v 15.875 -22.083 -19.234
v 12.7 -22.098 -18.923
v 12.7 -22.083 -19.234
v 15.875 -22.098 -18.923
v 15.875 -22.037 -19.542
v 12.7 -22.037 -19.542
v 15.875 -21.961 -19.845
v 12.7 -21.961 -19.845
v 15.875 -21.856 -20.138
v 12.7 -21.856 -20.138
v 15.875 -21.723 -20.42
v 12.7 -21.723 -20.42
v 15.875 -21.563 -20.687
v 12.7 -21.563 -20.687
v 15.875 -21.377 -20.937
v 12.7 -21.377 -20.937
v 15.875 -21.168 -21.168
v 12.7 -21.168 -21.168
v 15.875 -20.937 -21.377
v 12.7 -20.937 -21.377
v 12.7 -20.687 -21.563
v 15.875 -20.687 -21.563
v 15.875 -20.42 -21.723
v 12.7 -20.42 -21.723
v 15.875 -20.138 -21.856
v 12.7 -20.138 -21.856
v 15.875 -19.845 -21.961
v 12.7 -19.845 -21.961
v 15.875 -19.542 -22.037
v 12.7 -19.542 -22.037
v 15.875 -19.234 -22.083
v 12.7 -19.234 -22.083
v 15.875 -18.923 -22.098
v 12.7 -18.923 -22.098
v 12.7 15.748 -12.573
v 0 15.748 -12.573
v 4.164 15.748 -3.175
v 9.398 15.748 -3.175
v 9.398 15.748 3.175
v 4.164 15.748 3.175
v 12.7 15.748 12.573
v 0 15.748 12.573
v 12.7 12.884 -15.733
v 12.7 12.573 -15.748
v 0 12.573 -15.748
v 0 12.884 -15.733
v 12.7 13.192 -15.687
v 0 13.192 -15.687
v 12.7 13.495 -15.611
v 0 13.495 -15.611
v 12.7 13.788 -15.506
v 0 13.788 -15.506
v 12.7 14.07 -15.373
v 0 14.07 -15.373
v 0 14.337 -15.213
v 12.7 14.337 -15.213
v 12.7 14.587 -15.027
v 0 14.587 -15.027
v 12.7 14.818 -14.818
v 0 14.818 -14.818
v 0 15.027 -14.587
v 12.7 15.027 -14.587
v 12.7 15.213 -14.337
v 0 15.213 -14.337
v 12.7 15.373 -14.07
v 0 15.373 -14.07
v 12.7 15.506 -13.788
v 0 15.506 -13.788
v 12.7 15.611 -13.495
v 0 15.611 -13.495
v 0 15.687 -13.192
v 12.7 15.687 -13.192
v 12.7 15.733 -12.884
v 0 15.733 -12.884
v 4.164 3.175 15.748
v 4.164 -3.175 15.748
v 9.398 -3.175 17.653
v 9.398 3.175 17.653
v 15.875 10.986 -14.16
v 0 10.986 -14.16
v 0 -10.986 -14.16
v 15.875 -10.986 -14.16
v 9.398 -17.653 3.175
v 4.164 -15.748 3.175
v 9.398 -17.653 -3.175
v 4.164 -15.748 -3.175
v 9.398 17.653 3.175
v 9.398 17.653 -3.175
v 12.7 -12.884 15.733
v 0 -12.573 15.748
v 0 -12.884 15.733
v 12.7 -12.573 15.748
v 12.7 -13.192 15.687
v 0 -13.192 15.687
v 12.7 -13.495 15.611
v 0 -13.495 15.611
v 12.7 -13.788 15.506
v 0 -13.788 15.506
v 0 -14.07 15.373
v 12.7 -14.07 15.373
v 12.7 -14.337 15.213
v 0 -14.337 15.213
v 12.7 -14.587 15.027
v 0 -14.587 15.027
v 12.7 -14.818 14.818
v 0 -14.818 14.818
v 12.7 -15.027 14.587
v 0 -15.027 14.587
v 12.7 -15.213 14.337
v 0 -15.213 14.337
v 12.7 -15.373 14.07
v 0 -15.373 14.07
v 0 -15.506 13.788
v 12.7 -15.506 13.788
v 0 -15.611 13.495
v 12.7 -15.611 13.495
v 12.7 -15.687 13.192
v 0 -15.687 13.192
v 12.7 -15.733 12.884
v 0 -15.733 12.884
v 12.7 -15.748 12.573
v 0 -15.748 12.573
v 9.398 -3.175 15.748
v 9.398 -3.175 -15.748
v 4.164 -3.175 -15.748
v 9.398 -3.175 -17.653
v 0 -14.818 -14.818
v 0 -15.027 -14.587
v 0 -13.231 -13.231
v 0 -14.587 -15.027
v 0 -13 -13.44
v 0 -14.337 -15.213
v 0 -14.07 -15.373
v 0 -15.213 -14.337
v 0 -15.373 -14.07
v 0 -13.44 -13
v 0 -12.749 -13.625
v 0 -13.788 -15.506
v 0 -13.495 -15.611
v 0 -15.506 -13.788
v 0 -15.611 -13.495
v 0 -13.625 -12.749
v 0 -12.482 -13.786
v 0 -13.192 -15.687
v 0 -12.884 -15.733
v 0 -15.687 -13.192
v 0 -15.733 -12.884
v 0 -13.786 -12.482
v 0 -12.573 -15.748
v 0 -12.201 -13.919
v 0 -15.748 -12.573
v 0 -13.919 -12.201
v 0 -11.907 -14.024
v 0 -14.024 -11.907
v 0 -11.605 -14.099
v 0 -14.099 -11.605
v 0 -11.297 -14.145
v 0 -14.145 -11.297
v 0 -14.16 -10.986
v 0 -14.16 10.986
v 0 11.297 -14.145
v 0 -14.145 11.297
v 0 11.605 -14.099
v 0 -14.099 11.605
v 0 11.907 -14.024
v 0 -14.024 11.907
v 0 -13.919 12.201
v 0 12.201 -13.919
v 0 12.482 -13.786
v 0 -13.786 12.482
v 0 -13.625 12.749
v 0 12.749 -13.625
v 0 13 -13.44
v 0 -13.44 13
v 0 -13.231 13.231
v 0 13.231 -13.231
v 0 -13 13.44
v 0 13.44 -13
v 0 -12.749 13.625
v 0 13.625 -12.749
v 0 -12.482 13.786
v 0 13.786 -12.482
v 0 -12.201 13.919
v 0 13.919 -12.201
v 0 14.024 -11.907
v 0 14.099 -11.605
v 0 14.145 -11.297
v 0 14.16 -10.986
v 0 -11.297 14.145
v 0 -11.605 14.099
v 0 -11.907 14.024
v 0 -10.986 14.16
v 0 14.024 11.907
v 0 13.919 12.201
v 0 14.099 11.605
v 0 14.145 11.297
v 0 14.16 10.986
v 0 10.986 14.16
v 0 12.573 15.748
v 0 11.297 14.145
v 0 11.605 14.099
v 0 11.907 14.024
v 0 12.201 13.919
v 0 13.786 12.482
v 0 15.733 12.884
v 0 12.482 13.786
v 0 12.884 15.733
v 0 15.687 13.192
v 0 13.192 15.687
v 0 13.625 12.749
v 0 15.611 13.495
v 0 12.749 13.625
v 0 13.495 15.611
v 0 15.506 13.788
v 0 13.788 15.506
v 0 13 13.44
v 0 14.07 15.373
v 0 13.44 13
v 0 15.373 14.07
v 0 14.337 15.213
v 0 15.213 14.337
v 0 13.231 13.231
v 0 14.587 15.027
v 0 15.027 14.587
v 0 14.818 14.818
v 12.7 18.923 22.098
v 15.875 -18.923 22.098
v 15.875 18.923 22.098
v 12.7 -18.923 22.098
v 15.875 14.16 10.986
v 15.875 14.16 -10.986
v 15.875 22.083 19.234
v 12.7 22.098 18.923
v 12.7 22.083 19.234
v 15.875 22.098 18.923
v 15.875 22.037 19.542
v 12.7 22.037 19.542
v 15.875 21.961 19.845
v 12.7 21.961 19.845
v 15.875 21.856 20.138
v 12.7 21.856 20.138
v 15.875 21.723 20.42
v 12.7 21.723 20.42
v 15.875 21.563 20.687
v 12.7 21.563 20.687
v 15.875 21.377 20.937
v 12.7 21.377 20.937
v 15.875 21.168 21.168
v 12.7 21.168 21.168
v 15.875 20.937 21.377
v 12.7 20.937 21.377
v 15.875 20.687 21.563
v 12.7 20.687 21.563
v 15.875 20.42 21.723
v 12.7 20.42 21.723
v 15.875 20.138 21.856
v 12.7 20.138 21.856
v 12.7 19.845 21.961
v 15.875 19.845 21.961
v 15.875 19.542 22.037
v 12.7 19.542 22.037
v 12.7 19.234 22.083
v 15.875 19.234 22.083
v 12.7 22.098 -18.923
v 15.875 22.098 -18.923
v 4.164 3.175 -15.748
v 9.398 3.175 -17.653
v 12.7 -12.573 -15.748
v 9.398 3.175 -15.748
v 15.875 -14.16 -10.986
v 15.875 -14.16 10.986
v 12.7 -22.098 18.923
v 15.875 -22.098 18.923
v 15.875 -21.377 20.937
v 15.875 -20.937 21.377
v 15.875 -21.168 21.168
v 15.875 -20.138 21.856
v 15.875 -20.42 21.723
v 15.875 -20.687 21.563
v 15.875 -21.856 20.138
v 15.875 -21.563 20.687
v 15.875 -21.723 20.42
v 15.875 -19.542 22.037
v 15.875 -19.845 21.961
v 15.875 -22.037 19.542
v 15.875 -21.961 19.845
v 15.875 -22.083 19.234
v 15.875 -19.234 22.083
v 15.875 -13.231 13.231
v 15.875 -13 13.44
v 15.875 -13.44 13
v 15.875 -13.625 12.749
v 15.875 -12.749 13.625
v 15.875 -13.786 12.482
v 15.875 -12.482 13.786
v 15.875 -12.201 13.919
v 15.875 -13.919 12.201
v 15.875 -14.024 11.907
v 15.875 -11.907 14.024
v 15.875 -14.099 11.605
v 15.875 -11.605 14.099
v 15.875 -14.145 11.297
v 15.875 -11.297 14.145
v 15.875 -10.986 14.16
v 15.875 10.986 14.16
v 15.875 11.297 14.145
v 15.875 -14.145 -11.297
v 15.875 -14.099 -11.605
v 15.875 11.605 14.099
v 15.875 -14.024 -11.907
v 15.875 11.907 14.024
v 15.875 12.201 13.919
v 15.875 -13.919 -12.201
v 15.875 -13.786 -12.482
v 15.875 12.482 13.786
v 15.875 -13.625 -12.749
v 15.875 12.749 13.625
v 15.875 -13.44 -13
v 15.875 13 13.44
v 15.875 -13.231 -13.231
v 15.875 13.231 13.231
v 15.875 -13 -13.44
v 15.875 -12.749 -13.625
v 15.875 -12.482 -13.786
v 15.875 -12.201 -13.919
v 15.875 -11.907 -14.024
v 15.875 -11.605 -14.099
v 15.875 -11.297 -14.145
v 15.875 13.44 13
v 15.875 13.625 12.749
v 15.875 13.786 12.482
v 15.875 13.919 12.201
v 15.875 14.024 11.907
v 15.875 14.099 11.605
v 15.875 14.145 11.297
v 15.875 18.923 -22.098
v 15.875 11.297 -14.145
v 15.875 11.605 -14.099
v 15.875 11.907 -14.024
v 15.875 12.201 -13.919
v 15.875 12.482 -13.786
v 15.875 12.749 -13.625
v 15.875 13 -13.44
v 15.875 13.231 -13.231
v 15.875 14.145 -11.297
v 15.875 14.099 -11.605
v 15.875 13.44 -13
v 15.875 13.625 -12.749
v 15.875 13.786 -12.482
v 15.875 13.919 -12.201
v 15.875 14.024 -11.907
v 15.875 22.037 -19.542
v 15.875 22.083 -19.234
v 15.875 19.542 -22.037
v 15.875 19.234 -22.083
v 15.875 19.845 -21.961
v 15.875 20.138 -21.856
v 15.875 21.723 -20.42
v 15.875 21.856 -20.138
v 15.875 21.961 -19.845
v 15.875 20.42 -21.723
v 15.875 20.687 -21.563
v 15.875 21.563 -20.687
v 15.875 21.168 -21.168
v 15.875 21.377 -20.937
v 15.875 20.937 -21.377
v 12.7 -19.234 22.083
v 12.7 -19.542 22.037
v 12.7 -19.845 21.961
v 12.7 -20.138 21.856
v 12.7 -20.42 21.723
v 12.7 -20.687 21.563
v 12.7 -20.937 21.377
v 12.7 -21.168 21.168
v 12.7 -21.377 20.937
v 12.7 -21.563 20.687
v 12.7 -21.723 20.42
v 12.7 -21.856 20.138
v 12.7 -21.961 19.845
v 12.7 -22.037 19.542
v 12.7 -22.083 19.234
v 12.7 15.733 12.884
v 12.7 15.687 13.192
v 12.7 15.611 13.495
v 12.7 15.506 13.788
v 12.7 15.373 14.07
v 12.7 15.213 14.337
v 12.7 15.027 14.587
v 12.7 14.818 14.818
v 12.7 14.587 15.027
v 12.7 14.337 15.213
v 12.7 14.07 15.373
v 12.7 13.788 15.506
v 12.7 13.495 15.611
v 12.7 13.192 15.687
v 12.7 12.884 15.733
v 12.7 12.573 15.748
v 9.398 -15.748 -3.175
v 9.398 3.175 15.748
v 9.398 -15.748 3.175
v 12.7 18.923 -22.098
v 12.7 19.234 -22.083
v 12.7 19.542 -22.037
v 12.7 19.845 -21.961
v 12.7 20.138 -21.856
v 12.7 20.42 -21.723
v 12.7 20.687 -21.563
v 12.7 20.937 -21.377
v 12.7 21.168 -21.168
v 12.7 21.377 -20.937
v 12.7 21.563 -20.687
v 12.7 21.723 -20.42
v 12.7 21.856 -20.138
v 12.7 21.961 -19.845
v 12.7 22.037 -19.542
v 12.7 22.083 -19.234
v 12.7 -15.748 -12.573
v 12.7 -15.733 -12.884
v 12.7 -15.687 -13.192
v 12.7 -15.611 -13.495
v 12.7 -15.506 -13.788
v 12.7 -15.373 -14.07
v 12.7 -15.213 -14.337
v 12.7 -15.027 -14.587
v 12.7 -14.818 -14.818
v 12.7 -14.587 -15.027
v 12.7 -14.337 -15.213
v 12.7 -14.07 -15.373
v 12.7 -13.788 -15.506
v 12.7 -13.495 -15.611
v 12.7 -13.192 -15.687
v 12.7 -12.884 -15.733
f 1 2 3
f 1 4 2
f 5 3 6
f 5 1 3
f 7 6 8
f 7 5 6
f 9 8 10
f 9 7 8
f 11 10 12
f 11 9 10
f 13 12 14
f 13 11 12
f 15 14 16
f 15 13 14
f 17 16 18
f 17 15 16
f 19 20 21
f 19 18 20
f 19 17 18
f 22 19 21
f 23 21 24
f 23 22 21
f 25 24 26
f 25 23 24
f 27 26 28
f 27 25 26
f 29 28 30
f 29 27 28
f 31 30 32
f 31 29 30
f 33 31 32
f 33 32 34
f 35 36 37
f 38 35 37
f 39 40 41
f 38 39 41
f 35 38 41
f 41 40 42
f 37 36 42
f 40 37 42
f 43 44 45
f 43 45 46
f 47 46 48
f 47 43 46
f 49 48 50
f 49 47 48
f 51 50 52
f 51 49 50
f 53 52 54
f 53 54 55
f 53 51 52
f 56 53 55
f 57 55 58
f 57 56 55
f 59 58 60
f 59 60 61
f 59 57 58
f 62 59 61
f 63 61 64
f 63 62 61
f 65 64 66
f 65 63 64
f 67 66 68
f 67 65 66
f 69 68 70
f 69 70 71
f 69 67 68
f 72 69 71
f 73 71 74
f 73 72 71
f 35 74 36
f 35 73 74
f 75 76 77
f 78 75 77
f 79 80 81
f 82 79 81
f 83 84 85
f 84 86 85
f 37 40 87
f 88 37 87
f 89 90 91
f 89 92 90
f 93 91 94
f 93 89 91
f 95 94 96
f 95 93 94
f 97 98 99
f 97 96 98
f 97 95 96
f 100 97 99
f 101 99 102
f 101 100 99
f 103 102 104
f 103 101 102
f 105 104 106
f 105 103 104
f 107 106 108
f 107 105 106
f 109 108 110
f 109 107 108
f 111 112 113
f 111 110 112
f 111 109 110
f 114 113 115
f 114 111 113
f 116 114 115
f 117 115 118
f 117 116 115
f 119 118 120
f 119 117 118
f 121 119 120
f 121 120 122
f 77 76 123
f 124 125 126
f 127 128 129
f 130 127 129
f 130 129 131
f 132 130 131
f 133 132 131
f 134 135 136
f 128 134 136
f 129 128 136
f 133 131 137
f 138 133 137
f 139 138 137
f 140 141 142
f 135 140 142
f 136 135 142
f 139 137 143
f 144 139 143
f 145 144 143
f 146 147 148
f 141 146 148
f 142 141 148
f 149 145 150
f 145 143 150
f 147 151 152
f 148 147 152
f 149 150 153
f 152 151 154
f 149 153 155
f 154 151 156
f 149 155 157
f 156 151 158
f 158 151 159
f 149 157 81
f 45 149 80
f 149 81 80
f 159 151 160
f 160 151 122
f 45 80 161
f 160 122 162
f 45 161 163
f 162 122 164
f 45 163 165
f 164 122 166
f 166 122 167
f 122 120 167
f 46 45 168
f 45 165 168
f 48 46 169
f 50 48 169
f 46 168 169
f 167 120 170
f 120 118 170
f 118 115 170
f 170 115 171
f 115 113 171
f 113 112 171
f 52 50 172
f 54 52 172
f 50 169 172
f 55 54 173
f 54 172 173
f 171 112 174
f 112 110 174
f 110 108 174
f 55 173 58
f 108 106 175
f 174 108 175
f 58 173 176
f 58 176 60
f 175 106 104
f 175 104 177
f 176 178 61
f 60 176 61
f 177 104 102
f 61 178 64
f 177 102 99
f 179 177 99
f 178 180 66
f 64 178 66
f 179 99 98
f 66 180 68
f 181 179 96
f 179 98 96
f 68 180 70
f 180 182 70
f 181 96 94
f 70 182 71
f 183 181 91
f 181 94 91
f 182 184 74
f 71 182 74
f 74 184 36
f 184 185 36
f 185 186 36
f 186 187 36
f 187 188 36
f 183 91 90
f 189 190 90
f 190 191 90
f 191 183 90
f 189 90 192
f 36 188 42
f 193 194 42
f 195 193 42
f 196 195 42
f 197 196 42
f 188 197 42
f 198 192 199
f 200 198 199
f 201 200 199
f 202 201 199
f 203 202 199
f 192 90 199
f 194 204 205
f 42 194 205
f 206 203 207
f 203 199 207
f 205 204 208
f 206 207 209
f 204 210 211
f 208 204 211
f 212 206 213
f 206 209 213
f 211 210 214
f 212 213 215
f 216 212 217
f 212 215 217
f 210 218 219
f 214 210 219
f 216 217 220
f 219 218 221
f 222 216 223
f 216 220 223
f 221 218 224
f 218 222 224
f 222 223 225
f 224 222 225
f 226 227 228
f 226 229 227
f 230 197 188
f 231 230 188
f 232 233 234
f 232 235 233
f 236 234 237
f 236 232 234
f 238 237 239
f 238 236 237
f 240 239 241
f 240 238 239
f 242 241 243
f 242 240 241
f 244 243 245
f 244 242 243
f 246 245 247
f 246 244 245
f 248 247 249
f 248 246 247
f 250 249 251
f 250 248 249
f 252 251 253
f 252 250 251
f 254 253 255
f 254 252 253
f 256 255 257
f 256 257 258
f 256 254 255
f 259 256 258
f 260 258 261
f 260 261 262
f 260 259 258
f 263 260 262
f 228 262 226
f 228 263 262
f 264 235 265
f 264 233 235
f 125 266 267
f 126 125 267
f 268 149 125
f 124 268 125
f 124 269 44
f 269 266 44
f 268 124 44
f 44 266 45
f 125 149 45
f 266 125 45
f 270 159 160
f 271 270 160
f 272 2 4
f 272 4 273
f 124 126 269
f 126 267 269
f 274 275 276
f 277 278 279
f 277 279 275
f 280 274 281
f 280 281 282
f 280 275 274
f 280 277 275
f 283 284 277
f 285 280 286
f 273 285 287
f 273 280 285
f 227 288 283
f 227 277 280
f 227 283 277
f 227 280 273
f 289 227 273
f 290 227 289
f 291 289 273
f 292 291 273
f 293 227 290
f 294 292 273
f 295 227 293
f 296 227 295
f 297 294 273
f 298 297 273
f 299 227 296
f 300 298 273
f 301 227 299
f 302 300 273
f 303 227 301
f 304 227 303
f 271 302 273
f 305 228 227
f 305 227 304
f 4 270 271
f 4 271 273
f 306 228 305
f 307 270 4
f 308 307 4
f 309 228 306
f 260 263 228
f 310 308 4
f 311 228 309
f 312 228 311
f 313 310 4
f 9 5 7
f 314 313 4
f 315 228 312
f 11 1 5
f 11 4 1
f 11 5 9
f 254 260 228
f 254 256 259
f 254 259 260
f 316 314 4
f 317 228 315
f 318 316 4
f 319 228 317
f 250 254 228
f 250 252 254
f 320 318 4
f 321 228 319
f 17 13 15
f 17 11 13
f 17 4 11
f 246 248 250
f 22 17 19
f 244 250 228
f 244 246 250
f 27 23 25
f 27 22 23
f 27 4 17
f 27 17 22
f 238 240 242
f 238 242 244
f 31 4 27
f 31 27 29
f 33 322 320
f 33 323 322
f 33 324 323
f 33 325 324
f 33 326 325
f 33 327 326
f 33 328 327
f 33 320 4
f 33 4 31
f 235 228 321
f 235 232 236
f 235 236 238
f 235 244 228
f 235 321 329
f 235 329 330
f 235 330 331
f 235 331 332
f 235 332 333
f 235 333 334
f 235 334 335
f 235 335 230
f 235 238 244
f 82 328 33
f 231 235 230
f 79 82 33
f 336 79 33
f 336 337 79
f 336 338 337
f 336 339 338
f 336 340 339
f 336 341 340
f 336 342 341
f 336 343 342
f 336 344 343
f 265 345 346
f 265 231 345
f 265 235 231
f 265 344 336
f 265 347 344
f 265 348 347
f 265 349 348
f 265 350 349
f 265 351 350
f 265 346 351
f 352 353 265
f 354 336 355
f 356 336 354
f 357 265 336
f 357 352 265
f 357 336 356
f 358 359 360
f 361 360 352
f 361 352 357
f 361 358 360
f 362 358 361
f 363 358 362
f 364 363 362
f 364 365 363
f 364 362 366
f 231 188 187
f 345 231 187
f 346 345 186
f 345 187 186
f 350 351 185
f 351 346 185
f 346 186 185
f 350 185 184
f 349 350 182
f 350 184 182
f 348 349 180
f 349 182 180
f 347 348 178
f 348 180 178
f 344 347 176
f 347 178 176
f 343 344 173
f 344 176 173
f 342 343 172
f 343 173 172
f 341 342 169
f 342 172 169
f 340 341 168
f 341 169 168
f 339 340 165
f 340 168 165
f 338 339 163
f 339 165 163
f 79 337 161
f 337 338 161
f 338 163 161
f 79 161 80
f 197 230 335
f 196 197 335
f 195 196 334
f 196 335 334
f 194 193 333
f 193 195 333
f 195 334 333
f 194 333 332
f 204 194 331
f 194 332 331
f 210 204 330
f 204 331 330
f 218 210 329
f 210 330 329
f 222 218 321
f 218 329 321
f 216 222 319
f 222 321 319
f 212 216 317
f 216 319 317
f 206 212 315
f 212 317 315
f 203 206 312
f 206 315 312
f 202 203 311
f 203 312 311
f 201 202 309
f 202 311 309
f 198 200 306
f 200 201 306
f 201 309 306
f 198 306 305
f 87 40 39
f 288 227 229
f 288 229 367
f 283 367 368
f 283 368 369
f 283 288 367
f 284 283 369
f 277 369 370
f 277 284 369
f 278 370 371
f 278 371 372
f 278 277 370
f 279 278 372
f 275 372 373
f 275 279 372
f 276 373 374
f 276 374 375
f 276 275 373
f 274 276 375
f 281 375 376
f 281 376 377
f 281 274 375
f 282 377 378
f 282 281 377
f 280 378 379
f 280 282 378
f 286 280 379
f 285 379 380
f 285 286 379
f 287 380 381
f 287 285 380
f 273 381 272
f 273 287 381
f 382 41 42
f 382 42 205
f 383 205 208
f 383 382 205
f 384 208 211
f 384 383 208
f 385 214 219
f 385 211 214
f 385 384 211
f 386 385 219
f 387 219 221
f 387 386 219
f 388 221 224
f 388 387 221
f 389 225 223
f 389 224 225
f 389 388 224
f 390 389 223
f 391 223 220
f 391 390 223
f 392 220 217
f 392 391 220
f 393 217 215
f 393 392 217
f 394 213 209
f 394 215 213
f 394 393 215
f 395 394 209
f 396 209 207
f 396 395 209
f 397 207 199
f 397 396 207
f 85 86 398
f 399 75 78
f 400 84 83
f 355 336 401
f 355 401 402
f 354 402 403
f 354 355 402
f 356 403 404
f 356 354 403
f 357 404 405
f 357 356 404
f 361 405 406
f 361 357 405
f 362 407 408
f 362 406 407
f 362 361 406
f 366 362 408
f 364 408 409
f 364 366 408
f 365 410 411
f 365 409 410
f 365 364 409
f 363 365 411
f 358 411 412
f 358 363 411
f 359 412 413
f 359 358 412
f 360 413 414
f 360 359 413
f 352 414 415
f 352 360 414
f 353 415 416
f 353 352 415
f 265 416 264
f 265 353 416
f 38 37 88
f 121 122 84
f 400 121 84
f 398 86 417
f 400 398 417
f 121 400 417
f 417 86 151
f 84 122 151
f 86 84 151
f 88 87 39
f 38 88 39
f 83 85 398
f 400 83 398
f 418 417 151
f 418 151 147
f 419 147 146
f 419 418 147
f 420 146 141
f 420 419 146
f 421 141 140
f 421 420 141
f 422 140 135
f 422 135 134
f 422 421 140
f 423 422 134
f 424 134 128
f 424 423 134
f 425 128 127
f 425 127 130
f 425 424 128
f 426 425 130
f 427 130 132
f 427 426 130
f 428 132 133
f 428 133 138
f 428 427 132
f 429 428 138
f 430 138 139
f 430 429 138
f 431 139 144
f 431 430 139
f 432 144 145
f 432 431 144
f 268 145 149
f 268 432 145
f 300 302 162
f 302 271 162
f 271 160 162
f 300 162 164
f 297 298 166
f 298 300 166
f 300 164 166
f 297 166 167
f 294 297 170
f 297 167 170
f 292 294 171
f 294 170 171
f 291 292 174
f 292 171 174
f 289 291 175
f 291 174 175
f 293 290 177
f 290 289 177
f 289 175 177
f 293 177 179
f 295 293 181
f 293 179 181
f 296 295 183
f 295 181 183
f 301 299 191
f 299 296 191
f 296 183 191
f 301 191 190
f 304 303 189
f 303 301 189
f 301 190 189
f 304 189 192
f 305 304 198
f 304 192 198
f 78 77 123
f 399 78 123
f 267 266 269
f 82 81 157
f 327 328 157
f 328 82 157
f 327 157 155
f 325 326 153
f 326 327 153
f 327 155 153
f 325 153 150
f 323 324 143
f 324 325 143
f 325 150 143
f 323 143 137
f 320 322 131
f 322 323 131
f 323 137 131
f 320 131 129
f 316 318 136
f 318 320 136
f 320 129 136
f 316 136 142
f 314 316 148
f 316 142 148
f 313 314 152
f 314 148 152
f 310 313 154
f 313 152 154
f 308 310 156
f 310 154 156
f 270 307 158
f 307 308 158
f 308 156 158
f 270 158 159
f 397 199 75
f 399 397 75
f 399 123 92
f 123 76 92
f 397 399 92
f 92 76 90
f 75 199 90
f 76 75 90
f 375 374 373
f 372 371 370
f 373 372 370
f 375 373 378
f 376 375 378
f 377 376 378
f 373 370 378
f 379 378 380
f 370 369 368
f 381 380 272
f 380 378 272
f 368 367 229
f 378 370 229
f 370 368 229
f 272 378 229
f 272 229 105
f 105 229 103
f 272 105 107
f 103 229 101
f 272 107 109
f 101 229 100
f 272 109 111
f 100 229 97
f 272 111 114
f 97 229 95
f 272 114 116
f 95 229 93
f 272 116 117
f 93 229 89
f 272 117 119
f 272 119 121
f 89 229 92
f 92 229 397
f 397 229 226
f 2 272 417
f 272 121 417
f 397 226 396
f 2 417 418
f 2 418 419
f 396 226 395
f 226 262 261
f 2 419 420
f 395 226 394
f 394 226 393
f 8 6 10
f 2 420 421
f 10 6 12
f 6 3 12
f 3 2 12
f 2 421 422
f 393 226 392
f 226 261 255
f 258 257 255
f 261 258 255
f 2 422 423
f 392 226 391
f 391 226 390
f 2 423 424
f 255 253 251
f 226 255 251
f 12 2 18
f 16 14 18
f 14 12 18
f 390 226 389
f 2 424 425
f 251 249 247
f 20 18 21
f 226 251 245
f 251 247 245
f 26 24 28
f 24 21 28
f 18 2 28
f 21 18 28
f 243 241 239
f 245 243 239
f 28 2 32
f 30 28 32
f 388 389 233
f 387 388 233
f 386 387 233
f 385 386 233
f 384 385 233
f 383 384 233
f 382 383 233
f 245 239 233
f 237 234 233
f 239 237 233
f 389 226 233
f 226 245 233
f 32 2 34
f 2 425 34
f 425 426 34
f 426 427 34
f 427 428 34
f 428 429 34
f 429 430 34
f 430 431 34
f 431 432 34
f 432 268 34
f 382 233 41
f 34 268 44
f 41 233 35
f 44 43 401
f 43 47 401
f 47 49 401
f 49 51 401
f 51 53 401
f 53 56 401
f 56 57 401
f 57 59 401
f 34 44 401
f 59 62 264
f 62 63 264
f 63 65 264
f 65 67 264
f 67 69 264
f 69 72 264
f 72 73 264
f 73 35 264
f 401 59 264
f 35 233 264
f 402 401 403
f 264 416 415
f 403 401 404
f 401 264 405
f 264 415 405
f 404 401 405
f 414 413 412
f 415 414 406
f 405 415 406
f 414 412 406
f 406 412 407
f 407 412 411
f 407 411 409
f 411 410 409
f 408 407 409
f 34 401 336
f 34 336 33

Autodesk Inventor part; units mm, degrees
ref_plane "YZ Plane" through (0, 0, 0) normal (1, 0, 0) x (0, 1, 0)
ref_plane "XZ Plane" through (0, 0, 0) normal (0, 1, 0) x (-1, 0, 0)
ref_plane "XY Plane" through (0, 0, 0) normal (0, 0, 1) x (1, 0, 0)
sketch "Sketch1" plane through (0, 0, 0) normal (1, 0, 0) x (0, 1, 0)
  line L0 (-15.748, -15.748) -> (15.748, -15.748)
  line L1 (15.748, -15.748) -> (15.748, 15.748)
  line L2 (15.748, 15.748) -> (-15.748, 15.748)
  line L3 (-15.748, 15.748) -> (-15.748, -15.748)
  line L4 (-15.748, -15.748) -> (15.748, 15.748) construction
  line L5 (15.748, -15.748) -> (-15.748, 15.748) construction
  line L6 (14.1605, 14.1605) -> (14.1605, -14.1605)
  line L7 (14.1605, -14.1605) -> (-14.1605, -14.1605)
  line L8 (-14.1605, -14.1605) -> (-14.1605, 14.1605)
  line L9 (-14.1605, 14.1605) -> (14.1605, 14.1605)
  point P0 (0, 0)
  dimension "d0" = 31.496
  dimension "d1" = 31.496
  dimension "d2" = 1.5875
extrude "Extrusion1" add sketch "Sketch1" along normal blind 12.7
sketch "Sketch2" plane through (12.7, 0, 0) normal (1, 0, 0) x (0, 0, -1)
  line L0 (15.748, 15.748) -> (-15.748, 15.748) projected
  line L1 (-15.748, 15.748) -> (-15.748, -15.748) projected
  line L2 (-15.748, -15.748) -> (15.748, -15.748) projected
  line L3 (15.748, -15.748) -> (15.748, 15.748) projected
  line L4 (-14.1605, 14.1605) -> (14.1605, 14.1605) projected
  line L5 (14.1605, 14.1605) -> (14.1605, -14.1605) projected
  line L6 (14.1605, -14.1605) -> (-14.1605, -14.1605) projected
  line L7 (-14.1605, -14.1605) -> (-14.1605, 14.1605) projected
  line L8 (-22.098, 22.098) -> (22.098, 22.098)
  line L9 (22.098, 22.098) -> (22.098, -22.098)
  line L10 (22.098, -22.098) -> (-22.098, -22.098)
  line L11 (-22.098, -22.098) -> (-22.098, 22.098)
  point P0 (0, 0)
  dimension "d5" = 6.35
extrude "Extrusion2" add sketch "Sketch2" along normal blind 3.175 contours L3 L2 L1 L0 | L8 L9 L10 L11
fillet "Fillet1" radius 3.175 12 edges at (6.35, 15.748, 15.748) (6.35, 15.748, -15.748) (6.35, -15.748, 15.748) (6.35, -15.748, -15.748) (7.9375, 14.1605, 14.1605) (7.9375, -14.1605, 14.1605) (7.9375, -14.1605, -14.1605) (7.9375, 14.1605, -14.1605) (14.2875, -22.098, 22.098) (14.2875, -22.098, -22.098) (14.2875, 22.098, -22.098) (14.2875, 22.098, 22.098)
sketch "Sketch4" plane through (0, 0, 0) normal (0, 0, 1) x (1, 0, 0)
  line L0 (0, -15.748) -> (12.7, -15.748) construction
  line L1 (4.1641, -15.748) -> (9.398, -17.653)
  line L2 (9.398, -17.653) -> (9.398, -15.748)
  line L3 (12.7, -18.923) -> (12.7, 18.923) construction
  line L4 (4.1641, -15.748) -> (9.398, -15.748)
  point P0 (0, 0)
  dimension "d9" = 3.302
  dimension "d10" = 1.905
  dimension "d11" = 20
extrude "Extrusion3" add sketch "Sketch4" along normal mid plane 6.35
pattern_circular "Circular Pattern1" count 4 over 360 about axis through (-10, 0, 0) along (1, 0, 0) of "Extrusion3"
properties part number "DB1-013" material "ABS Plastic"
